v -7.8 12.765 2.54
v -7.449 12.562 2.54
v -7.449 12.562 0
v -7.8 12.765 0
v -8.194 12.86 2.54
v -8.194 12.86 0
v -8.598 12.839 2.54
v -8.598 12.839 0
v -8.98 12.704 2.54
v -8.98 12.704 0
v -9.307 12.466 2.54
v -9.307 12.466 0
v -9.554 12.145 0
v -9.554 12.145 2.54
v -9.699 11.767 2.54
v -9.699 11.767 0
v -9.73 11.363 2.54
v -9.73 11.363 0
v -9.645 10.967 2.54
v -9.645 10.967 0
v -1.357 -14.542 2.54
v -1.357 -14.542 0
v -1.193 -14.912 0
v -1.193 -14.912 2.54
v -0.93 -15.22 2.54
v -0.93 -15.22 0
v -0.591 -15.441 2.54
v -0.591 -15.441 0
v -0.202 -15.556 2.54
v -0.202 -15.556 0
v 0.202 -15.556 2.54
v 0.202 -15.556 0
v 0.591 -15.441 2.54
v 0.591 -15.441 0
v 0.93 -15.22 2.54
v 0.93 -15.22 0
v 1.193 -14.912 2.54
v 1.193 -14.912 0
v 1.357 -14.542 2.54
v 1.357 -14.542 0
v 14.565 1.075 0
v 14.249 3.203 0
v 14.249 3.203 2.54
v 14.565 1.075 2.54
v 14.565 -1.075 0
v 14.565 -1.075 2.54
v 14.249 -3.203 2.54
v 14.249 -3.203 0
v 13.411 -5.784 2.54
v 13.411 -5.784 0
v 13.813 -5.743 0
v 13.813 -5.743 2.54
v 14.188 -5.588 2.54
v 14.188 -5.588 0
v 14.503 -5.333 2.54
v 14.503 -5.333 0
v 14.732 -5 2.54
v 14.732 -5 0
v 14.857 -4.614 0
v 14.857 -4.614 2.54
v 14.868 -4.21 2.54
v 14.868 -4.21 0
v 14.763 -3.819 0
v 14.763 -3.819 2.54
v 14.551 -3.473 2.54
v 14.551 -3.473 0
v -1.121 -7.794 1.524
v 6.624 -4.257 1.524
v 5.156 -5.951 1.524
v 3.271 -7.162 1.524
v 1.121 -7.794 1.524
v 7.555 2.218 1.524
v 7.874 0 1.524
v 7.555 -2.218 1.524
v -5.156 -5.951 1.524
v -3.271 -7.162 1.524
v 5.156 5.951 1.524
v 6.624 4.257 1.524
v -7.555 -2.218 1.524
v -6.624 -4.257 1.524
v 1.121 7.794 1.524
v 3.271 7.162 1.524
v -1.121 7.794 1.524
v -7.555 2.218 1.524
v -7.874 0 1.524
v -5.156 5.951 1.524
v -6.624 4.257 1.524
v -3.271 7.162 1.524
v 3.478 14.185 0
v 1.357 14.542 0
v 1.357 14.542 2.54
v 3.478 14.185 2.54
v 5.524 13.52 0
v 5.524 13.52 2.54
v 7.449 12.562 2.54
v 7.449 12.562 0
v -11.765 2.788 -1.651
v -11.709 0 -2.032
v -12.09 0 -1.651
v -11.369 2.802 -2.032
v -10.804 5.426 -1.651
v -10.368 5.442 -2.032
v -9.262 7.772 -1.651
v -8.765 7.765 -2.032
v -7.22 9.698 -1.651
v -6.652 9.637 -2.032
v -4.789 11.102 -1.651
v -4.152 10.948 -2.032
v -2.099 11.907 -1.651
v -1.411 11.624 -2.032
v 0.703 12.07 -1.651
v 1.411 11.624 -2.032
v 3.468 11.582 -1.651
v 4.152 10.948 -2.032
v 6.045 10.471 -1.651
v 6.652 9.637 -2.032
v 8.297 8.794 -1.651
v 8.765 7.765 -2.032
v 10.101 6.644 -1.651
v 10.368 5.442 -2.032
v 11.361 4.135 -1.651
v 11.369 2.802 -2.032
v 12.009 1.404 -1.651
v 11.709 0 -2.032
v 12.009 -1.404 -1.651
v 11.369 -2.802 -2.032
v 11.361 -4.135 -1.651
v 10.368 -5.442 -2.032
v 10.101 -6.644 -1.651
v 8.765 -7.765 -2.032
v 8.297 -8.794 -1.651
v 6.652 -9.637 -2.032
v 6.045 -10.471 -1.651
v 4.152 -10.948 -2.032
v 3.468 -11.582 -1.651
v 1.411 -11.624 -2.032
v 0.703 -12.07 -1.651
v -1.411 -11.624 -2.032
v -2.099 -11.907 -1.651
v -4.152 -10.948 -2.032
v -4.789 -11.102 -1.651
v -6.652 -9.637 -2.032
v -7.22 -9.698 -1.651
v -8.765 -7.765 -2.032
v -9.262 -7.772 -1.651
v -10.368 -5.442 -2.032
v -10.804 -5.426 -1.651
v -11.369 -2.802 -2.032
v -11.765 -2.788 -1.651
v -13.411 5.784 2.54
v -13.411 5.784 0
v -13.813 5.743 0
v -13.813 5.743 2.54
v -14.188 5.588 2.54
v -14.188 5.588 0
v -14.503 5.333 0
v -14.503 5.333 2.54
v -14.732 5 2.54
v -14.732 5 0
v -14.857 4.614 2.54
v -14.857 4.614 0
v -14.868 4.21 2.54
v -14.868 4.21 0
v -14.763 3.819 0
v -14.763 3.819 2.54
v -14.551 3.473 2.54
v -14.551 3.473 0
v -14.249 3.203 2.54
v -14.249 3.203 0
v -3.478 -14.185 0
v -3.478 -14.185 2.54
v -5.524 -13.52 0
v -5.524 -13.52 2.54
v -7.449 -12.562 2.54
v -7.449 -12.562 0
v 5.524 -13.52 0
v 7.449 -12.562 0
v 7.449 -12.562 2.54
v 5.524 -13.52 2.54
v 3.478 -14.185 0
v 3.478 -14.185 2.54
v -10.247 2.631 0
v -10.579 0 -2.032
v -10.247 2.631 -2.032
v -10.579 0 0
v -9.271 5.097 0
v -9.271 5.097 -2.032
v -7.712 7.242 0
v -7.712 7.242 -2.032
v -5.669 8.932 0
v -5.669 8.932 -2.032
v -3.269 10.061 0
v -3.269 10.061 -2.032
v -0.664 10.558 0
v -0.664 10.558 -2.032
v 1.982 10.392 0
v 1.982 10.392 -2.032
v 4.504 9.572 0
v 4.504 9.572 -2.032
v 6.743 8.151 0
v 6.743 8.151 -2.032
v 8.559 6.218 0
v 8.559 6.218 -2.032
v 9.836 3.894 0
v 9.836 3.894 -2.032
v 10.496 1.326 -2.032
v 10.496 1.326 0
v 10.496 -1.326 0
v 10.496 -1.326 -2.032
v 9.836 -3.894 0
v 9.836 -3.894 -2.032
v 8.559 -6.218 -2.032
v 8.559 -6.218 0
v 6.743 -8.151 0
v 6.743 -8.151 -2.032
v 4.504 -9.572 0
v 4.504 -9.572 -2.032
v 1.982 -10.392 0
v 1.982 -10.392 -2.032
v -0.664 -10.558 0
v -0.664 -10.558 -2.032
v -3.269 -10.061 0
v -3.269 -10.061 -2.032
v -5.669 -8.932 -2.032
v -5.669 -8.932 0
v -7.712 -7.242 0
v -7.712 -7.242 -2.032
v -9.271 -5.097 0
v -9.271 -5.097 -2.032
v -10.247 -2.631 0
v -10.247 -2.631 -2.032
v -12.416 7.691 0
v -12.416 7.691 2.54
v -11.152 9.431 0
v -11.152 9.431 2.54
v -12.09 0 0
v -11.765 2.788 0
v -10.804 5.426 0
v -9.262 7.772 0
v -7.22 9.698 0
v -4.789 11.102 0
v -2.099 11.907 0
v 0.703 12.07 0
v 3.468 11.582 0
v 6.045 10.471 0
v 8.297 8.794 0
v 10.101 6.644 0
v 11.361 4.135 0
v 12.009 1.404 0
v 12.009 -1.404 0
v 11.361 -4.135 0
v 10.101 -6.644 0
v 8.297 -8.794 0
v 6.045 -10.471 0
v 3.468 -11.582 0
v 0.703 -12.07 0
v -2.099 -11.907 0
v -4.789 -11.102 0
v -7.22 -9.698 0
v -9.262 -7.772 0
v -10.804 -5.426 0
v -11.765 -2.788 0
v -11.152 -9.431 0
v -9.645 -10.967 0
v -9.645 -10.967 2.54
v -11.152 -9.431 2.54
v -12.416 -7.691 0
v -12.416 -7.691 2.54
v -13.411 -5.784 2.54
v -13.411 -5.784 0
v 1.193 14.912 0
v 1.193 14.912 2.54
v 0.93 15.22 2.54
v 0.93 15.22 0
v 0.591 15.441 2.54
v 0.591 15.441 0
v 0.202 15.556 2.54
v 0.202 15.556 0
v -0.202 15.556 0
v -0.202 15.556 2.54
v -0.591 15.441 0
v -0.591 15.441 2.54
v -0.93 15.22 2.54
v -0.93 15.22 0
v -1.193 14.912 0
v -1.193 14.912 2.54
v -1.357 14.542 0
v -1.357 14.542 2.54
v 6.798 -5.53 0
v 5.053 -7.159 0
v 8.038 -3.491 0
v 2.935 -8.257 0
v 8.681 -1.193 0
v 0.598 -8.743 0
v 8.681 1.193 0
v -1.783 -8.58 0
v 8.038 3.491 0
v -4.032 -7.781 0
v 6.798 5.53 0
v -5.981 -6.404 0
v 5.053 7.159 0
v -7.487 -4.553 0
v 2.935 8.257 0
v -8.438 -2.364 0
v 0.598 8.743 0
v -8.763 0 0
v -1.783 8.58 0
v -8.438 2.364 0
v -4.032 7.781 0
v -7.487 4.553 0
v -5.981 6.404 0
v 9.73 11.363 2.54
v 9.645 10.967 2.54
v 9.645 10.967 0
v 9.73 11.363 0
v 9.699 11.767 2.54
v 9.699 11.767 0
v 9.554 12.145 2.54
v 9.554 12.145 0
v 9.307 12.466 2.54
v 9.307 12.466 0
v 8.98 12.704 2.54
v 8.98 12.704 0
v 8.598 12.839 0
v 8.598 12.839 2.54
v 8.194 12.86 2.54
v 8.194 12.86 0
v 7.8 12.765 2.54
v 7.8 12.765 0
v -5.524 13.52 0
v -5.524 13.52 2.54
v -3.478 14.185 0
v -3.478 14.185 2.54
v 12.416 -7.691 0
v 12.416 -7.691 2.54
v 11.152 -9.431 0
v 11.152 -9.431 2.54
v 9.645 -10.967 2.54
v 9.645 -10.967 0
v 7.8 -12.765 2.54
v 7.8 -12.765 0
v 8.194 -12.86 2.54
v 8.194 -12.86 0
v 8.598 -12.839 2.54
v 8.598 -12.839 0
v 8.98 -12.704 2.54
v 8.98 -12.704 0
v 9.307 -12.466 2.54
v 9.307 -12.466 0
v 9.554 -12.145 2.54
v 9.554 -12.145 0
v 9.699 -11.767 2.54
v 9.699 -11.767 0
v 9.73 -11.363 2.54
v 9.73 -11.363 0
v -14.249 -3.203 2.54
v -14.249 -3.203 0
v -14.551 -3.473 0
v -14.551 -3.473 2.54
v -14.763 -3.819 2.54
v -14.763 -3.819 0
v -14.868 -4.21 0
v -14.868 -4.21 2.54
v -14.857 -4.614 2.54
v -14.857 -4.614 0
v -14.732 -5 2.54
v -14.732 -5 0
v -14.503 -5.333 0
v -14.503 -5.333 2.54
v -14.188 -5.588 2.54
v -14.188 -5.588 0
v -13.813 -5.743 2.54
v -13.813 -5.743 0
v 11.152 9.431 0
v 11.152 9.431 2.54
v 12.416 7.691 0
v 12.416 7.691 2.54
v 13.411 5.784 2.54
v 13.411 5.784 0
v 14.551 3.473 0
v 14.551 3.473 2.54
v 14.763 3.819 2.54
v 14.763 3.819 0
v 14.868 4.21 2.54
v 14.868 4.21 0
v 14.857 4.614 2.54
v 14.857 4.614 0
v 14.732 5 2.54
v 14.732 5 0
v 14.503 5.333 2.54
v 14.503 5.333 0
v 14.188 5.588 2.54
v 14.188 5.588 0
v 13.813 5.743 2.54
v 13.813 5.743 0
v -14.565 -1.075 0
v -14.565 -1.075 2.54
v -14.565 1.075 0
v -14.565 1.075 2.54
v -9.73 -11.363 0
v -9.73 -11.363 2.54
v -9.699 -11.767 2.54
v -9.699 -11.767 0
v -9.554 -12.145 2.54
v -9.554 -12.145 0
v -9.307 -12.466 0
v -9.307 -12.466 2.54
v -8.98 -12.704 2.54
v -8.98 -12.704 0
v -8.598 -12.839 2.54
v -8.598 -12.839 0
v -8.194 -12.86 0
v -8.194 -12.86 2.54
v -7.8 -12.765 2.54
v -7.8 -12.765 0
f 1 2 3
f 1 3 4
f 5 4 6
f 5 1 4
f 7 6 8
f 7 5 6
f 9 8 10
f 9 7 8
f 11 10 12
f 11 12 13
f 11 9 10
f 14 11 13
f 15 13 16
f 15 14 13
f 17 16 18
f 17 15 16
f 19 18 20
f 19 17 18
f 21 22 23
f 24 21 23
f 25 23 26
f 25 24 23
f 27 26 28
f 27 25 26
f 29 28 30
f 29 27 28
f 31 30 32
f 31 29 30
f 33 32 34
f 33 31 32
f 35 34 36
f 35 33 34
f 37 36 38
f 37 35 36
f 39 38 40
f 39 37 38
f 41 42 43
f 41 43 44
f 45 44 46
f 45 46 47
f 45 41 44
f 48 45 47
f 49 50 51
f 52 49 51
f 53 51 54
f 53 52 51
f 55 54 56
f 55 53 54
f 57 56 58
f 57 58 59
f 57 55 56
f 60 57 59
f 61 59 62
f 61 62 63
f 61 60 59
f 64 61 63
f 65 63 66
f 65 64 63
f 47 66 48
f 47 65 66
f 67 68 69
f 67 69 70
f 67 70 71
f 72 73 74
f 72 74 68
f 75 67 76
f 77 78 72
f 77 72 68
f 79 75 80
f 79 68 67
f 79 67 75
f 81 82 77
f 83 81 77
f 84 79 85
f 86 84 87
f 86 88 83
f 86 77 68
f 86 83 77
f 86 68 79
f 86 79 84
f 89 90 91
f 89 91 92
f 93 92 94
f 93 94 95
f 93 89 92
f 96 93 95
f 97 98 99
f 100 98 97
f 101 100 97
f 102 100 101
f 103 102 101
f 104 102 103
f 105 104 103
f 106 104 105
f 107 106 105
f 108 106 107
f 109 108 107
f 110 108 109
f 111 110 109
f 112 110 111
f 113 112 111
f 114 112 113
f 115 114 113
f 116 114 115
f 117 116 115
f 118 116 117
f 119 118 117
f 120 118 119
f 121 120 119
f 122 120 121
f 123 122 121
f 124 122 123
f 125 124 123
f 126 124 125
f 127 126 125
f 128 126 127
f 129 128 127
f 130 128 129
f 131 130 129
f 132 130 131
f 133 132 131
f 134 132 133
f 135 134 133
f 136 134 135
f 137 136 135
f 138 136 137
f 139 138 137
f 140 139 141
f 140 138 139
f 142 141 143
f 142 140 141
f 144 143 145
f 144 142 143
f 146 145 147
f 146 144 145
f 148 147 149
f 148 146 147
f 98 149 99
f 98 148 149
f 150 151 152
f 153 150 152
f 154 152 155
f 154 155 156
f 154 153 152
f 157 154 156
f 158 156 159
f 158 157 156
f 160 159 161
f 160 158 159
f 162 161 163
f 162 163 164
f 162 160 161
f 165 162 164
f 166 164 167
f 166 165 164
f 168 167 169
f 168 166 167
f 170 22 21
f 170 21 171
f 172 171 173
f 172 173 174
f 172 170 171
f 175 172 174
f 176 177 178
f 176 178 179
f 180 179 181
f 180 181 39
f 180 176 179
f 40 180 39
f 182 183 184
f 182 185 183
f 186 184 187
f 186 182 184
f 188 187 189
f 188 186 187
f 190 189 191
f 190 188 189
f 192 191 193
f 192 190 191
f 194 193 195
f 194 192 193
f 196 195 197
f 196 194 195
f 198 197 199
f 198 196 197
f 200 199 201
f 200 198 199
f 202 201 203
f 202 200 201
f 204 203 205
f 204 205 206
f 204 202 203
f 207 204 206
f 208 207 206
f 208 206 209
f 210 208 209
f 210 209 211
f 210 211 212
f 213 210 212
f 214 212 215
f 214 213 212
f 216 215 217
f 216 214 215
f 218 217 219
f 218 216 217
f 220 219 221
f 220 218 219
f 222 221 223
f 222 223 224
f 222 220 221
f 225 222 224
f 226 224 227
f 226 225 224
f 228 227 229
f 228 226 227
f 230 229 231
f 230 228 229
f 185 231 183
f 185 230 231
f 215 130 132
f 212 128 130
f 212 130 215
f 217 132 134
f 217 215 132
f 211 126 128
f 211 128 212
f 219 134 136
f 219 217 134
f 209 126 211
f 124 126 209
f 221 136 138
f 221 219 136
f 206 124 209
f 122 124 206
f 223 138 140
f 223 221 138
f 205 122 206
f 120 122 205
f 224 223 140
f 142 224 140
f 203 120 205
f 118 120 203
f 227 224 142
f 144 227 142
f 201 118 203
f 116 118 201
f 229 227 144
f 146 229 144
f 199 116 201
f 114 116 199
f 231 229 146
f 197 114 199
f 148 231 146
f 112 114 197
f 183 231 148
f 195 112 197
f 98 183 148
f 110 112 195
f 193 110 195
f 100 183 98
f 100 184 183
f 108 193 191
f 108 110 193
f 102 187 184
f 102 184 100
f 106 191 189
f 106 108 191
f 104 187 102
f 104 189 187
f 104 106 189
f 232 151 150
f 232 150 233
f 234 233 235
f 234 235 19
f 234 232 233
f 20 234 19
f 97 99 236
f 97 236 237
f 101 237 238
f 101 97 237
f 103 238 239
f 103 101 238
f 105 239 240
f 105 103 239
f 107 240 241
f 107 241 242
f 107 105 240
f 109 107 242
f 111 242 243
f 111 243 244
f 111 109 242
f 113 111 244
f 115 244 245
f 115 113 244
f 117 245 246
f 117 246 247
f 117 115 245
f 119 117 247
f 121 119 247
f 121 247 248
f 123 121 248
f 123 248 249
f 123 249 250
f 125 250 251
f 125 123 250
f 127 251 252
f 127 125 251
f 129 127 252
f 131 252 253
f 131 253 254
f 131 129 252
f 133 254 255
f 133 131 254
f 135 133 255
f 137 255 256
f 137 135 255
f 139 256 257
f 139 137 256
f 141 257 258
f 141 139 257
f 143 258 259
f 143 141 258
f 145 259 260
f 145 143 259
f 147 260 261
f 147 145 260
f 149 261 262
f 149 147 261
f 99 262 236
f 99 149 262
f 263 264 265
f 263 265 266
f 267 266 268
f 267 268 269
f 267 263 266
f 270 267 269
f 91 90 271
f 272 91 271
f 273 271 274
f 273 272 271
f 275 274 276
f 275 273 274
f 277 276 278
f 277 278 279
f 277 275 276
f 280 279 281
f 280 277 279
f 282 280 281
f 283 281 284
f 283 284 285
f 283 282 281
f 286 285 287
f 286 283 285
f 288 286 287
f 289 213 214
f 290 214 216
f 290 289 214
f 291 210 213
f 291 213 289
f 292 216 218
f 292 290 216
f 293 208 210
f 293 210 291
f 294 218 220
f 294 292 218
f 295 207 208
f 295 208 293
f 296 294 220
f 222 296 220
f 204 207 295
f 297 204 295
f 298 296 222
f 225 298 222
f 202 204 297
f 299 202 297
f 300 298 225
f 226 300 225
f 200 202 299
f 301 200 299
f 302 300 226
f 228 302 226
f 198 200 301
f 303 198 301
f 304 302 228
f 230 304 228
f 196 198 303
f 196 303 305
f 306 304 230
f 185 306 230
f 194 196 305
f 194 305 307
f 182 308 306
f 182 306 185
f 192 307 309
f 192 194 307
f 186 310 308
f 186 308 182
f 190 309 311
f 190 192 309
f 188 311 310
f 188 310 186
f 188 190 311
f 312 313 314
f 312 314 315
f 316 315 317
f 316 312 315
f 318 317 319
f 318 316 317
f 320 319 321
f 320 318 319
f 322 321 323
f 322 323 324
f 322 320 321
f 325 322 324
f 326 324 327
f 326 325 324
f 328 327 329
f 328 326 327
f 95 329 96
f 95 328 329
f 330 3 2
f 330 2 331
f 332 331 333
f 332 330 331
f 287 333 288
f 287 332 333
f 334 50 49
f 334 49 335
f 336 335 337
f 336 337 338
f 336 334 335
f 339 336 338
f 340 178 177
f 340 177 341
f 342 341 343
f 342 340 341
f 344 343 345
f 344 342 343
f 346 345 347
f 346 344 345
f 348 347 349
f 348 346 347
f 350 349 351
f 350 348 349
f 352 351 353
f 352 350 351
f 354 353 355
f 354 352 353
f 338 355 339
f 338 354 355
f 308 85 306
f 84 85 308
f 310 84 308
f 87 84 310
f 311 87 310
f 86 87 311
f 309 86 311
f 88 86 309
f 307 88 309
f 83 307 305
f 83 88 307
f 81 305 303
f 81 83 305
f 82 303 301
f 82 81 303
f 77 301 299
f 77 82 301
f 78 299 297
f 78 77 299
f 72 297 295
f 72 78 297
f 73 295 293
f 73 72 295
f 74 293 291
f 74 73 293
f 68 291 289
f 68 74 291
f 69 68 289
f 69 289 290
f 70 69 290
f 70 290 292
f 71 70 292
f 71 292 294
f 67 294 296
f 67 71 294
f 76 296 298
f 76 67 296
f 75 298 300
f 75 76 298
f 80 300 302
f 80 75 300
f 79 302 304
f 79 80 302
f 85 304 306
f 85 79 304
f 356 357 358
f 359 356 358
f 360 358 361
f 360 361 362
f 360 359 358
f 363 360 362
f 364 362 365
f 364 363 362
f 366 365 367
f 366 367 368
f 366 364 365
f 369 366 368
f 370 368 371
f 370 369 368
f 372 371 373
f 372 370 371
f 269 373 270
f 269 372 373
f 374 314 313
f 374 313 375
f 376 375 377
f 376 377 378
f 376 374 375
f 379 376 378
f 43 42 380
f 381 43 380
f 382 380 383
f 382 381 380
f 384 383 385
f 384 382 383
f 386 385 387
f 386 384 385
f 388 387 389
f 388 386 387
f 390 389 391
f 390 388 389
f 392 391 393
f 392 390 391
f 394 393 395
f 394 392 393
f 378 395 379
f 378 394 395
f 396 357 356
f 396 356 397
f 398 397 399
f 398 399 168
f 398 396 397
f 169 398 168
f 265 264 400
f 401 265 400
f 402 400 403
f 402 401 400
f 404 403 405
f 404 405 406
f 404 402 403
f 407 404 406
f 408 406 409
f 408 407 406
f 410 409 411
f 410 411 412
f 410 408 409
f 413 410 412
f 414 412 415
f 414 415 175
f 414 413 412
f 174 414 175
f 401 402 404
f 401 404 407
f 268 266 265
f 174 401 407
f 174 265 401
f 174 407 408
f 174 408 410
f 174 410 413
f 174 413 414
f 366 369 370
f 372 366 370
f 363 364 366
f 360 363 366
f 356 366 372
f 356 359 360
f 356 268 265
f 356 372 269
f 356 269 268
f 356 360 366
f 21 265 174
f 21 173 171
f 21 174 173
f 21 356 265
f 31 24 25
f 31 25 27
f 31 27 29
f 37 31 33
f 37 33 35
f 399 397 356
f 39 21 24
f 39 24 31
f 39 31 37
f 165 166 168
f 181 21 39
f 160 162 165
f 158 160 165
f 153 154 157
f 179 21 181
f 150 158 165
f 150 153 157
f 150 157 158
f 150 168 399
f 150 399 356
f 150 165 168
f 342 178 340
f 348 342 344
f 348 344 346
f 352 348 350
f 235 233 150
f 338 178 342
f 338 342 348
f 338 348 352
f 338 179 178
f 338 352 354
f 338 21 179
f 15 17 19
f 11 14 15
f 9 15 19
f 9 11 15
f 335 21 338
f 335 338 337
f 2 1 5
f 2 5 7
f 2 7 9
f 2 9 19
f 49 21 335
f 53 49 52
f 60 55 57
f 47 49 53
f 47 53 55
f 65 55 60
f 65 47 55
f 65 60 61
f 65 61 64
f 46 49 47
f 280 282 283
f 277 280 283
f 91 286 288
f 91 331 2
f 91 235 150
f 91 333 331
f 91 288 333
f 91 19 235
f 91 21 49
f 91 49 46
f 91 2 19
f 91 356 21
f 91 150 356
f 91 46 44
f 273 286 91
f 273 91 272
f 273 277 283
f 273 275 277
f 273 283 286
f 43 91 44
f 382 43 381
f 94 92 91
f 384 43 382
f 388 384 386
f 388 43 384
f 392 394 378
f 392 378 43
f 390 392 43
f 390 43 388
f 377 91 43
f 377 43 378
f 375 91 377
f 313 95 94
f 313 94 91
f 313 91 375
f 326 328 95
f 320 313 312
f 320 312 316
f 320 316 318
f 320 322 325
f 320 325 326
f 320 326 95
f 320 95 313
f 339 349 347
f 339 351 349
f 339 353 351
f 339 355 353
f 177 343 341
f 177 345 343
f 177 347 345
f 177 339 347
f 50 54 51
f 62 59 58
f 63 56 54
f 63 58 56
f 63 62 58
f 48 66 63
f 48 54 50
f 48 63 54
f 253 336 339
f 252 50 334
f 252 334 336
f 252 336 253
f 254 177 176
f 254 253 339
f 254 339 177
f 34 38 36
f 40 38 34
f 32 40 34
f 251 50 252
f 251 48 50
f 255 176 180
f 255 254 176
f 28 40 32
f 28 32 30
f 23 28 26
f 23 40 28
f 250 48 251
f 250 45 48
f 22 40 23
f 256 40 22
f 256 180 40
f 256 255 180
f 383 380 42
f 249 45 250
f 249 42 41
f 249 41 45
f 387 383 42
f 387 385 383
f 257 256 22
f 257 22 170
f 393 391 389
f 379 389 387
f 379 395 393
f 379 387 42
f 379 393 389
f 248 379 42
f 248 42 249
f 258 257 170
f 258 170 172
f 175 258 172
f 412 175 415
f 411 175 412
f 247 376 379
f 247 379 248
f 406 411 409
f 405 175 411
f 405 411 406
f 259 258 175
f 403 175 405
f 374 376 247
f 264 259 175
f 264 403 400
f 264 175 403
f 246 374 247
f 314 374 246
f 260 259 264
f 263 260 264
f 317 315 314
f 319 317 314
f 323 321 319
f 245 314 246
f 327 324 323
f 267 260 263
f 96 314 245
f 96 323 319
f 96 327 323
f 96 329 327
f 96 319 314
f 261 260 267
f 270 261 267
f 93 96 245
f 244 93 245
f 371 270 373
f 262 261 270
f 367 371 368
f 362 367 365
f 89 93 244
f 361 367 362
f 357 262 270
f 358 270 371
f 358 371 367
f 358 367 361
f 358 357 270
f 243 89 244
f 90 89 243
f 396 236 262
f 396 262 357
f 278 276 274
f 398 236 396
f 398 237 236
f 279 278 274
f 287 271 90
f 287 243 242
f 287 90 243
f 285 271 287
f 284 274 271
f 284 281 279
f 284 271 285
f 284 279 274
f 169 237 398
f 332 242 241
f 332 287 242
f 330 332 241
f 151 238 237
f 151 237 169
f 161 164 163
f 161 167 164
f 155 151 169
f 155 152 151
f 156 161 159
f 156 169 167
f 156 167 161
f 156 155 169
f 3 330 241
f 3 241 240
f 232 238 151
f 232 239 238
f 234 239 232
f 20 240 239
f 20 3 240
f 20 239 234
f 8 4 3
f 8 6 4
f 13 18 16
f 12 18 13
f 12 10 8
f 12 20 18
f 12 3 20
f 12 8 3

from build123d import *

# Parameters (mm, degrees)
F3_R            = 1.4097
F4_DEPTH        = 2.54
F4_COPIES_COUNT = 10
F5_SIZE         = 0.381


# Not quite as in the source:
# - a pattern or mirror of a feature is missing from the dataset's text; its kind, count and spacing are read off the source's solid


with BuildPart() as f2:
    # F1 (on Front) → F2 (revolve)
    with BuildSketch(Plane.XZ):
        Polygon((-14.605, 0), (-12.0904, 0), (-12.0904, -2.032), (-10.5791, -2.032), (-10.5791, 0), (-8.763, 0), (-7.874, 1.524), (0, 1.524), (0, 2.54), (-14.605, 2.54), align=None)
    revolve(axis=Axis((0, 0, -1.27), (0, 0, -1)))

    # F3 (on face) → F4 (join, through all)
    with BuildSketch(Plane.XY.offset(2.54)):
        with Locations((0, 14.1607994729)):
            Circle(F3_R)
    f4 = extrude(amount=-F4_DEPTH)

    # F4_copies: F4 ×10 about axis
    f4_copies_axis = Axis((0, 0, 0), (0, 0, 1))
    for i in range(1, F4_COPIES_COUNT):
        add(f4.rotate(f4_copies_axis, i * 360 / F4_COPIES_COUNT))

    # F5
    f5_edges = [f2.edges().sort_by_distance(p)[0] for p in [
        (12.0904, 0, -2.032),
    ]]
    chamfer(f5_edges, length=F5_SIZE)


solid = f2.part
